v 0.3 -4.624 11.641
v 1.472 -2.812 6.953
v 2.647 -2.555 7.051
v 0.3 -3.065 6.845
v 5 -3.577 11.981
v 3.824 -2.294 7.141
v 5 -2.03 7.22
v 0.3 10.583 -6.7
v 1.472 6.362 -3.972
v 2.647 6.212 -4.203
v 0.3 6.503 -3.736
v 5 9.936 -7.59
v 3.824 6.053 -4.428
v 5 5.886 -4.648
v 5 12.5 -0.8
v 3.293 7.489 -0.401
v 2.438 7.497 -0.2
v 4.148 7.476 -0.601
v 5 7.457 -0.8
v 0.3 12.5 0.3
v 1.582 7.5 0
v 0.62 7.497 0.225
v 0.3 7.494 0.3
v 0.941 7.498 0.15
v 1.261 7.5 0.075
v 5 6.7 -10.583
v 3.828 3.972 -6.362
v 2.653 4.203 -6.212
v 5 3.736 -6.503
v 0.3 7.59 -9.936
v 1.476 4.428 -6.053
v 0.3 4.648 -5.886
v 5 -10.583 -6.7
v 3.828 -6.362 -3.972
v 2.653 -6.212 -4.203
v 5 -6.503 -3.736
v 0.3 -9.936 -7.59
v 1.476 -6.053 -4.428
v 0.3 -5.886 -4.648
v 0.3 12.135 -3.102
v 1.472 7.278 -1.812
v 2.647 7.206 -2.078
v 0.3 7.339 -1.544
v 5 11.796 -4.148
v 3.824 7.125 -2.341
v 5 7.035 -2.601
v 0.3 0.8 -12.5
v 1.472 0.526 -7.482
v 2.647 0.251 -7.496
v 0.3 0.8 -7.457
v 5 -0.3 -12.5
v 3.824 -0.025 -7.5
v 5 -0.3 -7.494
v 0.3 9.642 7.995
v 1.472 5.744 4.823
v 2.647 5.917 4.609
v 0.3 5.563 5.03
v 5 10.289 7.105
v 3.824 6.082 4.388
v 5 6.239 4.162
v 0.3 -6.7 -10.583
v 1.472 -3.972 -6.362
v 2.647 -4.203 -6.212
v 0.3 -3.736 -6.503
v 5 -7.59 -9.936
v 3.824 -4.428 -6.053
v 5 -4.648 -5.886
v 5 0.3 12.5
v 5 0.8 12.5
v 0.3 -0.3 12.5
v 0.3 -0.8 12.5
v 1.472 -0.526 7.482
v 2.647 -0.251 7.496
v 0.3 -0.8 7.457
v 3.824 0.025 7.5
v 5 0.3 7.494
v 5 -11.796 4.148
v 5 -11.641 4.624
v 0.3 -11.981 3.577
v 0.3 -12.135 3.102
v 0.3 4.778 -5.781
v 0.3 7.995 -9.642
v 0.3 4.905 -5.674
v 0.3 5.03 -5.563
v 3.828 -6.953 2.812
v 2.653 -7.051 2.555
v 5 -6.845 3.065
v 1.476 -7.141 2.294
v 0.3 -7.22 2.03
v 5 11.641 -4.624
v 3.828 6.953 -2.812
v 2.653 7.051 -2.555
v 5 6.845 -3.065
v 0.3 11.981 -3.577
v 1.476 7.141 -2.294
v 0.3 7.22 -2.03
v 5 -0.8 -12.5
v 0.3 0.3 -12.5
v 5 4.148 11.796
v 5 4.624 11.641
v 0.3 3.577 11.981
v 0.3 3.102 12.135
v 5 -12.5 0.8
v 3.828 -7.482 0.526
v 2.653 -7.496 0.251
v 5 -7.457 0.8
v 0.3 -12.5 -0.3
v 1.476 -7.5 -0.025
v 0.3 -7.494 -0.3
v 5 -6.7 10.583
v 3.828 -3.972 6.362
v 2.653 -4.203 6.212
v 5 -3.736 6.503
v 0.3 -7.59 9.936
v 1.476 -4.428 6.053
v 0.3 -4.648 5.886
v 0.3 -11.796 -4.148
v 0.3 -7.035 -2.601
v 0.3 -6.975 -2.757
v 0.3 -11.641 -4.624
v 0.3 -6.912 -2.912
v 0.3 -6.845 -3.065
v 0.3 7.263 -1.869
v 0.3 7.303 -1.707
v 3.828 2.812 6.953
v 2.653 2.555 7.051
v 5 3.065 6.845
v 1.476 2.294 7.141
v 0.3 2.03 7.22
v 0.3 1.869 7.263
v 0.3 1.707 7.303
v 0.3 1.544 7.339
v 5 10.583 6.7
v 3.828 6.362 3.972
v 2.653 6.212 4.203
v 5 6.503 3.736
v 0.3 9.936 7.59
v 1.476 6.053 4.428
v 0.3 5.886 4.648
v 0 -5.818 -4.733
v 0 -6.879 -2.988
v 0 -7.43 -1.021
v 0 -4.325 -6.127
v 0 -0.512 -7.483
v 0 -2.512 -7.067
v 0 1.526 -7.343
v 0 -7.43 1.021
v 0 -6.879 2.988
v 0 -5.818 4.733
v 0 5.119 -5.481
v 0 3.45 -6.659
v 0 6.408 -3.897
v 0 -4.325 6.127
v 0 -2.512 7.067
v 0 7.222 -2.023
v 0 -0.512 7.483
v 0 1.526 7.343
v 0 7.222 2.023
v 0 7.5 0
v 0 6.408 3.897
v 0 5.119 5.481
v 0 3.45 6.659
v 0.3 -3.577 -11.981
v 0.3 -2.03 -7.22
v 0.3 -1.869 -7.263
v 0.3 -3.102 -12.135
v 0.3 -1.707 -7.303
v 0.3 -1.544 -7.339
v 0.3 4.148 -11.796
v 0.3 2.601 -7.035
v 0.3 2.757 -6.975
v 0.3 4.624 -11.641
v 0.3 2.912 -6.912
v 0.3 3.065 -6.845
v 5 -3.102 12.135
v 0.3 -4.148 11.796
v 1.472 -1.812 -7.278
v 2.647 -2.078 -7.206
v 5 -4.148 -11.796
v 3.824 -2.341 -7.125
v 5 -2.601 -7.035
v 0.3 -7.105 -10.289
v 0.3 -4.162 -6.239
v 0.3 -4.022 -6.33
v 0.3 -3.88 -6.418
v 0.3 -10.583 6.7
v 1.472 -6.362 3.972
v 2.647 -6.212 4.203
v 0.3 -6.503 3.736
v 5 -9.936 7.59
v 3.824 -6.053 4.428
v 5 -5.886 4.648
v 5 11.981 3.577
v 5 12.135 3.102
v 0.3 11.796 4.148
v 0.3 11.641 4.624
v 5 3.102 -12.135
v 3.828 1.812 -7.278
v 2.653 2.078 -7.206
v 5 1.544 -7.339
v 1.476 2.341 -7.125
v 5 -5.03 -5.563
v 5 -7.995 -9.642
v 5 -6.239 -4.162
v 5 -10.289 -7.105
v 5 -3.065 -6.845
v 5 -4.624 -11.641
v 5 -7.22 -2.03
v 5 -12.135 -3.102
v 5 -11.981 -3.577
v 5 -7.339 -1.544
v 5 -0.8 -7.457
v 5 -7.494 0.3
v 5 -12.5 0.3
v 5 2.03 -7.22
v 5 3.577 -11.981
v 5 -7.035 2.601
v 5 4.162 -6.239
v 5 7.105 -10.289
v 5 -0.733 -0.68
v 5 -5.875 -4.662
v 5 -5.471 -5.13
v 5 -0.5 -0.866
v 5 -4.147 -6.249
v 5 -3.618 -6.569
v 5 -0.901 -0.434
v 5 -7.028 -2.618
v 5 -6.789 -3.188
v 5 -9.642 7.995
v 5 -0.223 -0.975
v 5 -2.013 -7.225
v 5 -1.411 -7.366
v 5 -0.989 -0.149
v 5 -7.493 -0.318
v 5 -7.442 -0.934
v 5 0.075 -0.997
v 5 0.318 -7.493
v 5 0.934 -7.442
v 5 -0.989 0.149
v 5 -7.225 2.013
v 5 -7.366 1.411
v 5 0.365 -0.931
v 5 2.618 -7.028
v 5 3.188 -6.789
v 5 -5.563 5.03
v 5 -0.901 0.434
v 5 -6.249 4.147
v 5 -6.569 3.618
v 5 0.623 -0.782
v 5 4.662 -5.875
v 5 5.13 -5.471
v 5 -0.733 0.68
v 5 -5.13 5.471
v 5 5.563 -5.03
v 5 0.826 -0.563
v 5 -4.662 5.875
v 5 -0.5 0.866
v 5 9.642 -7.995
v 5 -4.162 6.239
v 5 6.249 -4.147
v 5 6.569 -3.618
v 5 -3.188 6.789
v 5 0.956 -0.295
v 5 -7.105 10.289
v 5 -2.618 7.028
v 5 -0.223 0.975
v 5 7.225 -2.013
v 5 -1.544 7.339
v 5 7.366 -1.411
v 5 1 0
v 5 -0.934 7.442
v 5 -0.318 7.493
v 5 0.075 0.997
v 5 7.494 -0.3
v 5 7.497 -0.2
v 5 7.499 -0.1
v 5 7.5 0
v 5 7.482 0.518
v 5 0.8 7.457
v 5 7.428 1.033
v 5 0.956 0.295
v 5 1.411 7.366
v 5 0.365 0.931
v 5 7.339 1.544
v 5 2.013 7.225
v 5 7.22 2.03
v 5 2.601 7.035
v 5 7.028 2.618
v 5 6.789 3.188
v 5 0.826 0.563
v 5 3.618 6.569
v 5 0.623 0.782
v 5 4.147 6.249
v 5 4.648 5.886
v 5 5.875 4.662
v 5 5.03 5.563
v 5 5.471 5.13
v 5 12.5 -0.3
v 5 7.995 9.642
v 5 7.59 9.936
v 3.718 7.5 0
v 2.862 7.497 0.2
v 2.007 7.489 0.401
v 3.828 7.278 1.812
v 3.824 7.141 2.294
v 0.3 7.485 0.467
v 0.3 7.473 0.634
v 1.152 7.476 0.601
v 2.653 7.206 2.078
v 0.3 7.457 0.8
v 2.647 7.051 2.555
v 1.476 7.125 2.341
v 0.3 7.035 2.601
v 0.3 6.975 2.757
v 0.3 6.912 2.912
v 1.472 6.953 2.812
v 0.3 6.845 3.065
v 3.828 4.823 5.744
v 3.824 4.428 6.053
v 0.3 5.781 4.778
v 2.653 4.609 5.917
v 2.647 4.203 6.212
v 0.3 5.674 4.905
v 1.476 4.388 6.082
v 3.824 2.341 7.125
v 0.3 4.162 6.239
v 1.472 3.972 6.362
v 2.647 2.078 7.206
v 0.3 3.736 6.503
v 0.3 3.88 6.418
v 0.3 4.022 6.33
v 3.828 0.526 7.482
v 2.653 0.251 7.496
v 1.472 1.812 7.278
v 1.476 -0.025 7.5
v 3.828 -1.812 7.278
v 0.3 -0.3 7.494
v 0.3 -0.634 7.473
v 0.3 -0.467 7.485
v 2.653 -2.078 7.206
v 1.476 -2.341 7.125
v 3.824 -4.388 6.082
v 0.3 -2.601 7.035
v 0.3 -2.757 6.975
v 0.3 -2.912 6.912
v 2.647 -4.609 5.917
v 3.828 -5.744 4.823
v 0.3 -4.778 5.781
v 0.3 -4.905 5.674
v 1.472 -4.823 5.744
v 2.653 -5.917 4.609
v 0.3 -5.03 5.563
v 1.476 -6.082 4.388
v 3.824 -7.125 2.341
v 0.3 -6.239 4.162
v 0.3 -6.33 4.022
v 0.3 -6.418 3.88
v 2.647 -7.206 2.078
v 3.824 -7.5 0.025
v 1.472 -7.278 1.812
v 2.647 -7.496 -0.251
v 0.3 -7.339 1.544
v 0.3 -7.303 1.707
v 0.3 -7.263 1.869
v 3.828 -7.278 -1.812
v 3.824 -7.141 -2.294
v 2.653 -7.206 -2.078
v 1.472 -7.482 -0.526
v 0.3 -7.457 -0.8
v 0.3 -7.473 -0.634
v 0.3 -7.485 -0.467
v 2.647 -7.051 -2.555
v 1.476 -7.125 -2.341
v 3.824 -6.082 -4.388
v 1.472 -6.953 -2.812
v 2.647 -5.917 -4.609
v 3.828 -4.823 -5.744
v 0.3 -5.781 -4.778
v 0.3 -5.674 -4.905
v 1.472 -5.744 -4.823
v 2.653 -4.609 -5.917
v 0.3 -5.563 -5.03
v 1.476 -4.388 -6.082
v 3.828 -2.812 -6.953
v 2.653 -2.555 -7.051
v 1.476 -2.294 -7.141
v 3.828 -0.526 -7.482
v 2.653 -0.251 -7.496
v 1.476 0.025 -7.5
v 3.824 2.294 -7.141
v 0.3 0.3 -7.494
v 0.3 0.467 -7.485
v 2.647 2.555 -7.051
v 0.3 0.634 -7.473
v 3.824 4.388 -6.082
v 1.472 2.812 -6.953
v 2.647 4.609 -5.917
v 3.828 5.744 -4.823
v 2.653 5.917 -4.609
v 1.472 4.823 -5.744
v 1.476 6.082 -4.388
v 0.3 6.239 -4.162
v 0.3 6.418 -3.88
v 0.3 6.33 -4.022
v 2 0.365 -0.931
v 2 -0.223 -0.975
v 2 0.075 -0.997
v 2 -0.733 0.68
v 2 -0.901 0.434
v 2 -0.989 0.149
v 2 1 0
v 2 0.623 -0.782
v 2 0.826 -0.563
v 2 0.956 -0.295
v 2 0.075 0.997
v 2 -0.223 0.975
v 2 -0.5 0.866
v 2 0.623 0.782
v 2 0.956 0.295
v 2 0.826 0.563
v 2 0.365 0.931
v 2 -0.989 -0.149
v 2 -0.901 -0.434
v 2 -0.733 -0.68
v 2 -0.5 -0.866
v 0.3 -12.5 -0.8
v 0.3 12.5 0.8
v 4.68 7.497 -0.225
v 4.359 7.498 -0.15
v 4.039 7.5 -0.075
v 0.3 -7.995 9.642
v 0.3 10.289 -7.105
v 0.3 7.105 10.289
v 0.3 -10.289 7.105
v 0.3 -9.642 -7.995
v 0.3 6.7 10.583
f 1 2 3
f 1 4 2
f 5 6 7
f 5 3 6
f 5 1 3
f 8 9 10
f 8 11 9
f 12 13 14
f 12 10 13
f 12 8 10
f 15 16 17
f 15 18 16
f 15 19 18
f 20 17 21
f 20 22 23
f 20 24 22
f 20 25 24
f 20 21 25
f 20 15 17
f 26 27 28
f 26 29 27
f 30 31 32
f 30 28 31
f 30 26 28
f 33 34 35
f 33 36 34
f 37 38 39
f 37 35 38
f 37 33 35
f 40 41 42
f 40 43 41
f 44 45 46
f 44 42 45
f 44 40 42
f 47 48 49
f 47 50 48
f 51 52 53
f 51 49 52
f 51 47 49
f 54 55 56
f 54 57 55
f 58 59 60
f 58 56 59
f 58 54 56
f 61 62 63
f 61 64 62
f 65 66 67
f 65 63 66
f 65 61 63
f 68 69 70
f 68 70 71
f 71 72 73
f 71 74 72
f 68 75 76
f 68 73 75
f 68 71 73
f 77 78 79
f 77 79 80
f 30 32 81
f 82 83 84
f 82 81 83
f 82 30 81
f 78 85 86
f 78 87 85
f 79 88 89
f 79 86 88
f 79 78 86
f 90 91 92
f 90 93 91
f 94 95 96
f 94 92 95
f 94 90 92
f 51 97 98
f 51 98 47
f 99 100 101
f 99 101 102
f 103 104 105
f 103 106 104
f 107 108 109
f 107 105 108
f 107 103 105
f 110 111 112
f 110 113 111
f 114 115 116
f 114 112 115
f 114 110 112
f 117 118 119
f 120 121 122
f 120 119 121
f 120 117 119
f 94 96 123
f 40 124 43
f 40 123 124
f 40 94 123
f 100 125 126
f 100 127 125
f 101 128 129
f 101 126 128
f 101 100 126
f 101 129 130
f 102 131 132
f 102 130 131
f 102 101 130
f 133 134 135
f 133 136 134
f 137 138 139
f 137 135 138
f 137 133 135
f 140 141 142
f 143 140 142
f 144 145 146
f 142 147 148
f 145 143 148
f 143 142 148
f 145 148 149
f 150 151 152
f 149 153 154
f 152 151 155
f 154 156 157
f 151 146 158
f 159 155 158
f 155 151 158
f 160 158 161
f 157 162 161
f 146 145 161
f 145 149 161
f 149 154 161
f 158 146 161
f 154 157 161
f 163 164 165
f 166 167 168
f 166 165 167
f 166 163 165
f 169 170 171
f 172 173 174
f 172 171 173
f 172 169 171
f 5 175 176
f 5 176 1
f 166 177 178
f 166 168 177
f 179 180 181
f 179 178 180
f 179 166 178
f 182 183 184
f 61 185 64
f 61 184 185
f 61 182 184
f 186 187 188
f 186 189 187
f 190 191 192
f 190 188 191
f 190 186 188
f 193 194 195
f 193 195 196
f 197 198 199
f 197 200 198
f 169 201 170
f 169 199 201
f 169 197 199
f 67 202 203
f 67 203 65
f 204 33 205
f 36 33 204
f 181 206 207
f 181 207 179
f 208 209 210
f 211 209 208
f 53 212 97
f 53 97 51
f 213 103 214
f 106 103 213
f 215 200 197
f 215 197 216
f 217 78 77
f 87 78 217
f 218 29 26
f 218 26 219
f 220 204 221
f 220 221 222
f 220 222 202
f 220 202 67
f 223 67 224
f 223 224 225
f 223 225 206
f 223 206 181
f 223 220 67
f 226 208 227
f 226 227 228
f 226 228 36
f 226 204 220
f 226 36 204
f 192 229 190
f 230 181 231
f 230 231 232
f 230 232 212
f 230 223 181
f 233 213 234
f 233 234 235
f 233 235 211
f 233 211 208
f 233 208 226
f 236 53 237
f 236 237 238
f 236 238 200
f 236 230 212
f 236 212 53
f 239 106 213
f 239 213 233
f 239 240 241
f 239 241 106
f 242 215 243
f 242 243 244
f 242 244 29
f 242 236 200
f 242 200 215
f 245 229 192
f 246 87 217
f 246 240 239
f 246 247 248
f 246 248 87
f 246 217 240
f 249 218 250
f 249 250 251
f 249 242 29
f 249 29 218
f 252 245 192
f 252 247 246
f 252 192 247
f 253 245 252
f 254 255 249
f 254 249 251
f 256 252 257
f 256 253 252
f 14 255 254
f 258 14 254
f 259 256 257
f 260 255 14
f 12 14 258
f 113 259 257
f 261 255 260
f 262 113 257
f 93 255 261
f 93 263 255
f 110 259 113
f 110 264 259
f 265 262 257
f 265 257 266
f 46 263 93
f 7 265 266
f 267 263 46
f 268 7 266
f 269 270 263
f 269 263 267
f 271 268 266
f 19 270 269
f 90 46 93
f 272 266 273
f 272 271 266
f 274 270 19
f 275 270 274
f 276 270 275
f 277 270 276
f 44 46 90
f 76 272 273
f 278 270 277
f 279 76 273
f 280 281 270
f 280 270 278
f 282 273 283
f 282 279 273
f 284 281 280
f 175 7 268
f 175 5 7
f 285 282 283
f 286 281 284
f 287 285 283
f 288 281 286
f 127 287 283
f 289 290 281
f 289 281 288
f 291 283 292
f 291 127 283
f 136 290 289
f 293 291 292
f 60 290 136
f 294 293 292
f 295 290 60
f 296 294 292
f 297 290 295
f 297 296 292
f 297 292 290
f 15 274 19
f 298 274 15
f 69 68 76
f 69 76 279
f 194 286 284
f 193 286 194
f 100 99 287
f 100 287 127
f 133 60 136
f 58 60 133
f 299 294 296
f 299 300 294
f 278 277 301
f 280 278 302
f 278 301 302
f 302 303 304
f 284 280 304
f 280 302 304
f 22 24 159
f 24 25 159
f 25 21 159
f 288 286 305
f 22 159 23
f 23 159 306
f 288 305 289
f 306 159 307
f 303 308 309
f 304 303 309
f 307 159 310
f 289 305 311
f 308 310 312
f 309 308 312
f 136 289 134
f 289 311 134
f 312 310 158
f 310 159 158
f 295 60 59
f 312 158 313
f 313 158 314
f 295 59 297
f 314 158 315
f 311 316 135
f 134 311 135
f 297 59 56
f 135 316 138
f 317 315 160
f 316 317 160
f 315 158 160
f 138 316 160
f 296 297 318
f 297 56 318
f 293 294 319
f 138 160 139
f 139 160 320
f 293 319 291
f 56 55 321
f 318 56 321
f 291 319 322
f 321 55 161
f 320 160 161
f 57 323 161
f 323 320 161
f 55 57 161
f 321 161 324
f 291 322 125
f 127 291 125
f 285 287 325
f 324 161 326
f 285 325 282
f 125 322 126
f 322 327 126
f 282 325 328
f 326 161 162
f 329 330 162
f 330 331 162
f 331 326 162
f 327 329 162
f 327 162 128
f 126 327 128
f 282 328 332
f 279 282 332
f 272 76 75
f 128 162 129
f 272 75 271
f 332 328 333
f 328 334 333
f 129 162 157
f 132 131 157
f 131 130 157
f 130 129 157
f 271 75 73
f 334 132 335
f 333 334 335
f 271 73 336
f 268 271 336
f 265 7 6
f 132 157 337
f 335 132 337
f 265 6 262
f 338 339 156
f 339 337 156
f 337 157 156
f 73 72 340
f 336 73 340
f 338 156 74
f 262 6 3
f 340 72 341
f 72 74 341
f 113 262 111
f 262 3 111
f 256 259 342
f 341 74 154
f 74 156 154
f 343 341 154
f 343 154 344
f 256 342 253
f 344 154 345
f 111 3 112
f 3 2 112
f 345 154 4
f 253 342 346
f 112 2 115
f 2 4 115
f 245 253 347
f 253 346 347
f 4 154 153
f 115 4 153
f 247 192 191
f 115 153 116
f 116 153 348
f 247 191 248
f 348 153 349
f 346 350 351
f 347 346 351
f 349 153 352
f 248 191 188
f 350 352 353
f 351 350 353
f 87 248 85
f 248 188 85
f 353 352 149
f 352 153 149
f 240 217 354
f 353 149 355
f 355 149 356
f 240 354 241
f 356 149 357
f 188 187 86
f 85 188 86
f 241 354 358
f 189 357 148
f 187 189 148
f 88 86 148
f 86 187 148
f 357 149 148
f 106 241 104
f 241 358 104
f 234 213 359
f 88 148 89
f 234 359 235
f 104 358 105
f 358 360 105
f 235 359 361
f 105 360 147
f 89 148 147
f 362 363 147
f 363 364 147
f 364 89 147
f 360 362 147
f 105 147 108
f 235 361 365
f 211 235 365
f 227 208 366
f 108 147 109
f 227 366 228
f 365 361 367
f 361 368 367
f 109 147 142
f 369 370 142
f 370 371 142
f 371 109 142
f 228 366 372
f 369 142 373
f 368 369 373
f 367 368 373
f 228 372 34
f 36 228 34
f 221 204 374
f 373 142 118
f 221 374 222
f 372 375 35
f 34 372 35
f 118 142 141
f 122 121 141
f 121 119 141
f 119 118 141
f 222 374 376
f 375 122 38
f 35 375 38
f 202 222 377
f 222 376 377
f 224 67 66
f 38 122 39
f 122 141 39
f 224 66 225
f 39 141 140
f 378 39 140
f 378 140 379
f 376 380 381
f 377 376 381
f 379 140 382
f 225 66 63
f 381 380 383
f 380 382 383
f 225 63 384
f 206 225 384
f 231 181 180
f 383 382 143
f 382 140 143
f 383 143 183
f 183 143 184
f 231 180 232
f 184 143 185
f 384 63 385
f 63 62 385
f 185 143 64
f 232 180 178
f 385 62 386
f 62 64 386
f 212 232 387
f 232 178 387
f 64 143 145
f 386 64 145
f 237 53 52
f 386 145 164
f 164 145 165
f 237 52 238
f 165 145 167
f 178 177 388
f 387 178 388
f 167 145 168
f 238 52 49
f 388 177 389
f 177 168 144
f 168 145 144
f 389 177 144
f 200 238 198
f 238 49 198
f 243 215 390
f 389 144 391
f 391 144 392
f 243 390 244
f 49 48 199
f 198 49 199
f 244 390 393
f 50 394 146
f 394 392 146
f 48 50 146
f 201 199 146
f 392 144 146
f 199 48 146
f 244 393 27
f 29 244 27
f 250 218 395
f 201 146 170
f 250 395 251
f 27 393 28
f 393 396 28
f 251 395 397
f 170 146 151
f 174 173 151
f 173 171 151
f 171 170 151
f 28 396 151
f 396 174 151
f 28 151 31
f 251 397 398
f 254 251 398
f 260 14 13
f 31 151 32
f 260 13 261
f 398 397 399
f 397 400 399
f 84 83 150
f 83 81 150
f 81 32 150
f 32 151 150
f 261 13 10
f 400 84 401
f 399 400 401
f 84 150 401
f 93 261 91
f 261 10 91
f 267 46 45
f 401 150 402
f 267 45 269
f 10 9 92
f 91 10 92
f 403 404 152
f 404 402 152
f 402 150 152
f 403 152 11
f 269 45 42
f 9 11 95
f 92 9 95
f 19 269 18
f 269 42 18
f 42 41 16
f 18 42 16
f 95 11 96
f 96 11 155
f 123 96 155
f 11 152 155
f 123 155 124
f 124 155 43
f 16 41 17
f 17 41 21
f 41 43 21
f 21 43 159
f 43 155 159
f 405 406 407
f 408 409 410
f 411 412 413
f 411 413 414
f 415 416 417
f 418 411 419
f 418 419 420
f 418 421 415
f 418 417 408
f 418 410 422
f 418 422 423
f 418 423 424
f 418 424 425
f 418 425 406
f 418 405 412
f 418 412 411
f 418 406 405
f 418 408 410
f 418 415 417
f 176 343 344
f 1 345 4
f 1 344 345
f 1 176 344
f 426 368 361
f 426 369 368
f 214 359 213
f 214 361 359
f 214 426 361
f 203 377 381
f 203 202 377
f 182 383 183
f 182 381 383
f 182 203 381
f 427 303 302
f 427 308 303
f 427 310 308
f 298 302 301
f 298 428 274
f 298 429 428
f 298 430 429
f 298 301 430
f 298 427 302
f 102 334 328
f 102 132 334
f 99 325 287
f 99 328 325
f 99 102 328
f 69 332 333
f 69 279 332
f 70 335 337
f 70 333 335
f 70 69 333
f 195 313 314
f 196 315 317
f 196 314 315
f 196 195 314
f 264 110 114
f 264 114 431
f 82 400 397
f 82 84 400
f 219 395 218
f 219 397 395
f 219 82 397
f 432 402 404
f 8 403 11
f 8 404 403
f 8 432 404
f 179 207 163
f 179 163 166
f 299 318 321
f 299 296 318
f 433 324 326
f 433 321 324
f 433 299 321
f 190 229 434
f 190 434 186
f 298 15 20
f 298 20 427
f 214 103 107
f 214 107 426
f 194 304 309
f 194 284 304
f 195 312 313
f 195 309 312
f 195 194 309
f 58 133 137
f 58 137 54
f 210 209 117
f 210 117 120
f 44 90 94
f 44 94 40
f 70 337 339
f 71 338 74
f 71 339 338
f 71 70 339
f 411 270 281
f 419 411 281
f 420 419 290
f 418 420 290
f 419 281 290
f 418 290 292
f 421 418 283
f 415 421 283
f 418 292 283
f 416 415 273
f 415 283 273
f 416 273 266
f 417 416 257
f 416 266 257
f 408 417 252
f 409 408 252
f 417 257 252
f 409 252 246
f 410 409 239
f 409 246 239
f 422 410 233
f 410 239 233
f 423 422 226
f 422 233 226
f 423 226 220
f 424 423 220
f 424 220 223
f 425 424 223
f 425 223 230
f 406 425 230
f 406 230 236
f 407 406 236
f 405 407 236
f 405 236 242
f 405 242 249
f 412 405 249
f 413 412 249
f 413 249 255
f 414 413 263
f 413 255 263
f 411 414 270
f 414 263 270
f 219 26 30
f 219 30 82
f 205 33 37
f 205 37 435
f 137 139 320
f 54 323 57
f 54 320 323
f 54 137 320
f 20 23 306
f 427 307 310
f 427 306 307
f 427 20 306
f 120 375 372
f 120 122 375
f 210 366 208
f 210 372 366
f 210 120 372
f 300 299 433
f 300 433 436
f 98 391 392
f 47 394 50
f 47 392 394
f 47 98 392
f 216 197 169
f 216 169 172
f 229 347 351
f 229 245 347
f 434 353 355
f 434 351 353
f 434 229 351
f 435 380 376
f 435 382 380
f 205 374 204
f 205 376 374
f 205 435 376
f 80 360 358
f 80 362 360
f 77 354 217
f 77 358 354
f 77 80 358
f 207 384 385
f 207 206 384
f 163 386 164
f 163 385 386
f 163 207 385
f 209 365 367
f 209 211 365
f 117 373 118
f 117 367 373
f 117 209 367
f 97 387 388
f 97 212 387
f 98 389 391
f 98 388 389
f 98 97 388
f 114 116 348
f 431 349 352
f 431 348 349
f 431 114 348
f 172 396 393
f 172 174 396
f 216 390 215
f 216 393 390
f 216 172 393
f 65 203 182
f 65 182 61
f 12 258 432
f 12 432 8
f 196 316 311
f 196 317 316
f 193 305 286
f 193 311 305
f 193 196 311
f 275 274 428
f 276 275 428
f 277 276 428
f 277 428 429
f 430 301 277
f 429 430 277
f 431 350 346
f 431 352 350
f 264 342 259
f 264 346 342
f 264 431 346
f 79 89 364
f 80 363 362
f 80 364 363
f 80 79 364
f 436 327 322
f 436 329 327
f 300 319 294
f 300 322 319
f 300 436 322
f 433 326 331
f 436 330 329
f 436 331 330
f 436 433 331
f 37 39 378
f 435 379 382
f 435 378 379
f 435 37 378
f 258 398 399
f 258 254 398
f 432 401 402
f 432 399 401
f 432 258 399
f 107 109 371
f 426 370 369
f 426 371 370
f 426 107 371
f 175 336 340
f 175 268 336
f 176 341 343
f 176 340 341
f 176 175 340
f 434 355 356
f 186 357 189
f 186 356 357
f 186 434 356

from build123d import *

# Parameters (mm, degrees)
SKETCH_R           = 7.5
PAD_DEPTH          = 5
SKETCH001_R        = 1
POCKET_DEPTH       = 3
PAD001_DEPTH       = 5
POLARPATTERN_COUNT = 20


with BuildPart() as part:
    # Sketch → Pad (new body)
    with BuildSketch(Plane.YZ):
        Circle(SKETCH_R)
    extrude(amount=PAD_DEPTH)

    # Sketch001 (on Face3 of Pad) → Pocket (cut)
    with BuildSketch(Plane.YZ.offset(5)):
        Circle(SKETCH001_R)
    extrude(amount=-POCKET_DEPTH, mode=Mode.SUBTRACT)

    # Sketch002 (on DatumPlane) → Pad001 (join, symmetric)
    with BuildSketch(Plane.ZX.offset(7.5)):
        Polygon((0.8, 0.3), (-0.3, 5), (-0.8, 5), (0.3, 0.3), align=None)
    pad001 = extrude(amount=PAD001_DEPTH, both=True)

    # PolarPattern: Pad001 ×20 about axis
    polarpattern_axis = Axis((0, 0, 0), (1, 0, 0))
    for i in range(1, POLARPATTERN_COUNT):
        add(pad001.rotate(polarpattern_axis, i * 360 / POLARPATTERN_COUNT))


solid = part.part
